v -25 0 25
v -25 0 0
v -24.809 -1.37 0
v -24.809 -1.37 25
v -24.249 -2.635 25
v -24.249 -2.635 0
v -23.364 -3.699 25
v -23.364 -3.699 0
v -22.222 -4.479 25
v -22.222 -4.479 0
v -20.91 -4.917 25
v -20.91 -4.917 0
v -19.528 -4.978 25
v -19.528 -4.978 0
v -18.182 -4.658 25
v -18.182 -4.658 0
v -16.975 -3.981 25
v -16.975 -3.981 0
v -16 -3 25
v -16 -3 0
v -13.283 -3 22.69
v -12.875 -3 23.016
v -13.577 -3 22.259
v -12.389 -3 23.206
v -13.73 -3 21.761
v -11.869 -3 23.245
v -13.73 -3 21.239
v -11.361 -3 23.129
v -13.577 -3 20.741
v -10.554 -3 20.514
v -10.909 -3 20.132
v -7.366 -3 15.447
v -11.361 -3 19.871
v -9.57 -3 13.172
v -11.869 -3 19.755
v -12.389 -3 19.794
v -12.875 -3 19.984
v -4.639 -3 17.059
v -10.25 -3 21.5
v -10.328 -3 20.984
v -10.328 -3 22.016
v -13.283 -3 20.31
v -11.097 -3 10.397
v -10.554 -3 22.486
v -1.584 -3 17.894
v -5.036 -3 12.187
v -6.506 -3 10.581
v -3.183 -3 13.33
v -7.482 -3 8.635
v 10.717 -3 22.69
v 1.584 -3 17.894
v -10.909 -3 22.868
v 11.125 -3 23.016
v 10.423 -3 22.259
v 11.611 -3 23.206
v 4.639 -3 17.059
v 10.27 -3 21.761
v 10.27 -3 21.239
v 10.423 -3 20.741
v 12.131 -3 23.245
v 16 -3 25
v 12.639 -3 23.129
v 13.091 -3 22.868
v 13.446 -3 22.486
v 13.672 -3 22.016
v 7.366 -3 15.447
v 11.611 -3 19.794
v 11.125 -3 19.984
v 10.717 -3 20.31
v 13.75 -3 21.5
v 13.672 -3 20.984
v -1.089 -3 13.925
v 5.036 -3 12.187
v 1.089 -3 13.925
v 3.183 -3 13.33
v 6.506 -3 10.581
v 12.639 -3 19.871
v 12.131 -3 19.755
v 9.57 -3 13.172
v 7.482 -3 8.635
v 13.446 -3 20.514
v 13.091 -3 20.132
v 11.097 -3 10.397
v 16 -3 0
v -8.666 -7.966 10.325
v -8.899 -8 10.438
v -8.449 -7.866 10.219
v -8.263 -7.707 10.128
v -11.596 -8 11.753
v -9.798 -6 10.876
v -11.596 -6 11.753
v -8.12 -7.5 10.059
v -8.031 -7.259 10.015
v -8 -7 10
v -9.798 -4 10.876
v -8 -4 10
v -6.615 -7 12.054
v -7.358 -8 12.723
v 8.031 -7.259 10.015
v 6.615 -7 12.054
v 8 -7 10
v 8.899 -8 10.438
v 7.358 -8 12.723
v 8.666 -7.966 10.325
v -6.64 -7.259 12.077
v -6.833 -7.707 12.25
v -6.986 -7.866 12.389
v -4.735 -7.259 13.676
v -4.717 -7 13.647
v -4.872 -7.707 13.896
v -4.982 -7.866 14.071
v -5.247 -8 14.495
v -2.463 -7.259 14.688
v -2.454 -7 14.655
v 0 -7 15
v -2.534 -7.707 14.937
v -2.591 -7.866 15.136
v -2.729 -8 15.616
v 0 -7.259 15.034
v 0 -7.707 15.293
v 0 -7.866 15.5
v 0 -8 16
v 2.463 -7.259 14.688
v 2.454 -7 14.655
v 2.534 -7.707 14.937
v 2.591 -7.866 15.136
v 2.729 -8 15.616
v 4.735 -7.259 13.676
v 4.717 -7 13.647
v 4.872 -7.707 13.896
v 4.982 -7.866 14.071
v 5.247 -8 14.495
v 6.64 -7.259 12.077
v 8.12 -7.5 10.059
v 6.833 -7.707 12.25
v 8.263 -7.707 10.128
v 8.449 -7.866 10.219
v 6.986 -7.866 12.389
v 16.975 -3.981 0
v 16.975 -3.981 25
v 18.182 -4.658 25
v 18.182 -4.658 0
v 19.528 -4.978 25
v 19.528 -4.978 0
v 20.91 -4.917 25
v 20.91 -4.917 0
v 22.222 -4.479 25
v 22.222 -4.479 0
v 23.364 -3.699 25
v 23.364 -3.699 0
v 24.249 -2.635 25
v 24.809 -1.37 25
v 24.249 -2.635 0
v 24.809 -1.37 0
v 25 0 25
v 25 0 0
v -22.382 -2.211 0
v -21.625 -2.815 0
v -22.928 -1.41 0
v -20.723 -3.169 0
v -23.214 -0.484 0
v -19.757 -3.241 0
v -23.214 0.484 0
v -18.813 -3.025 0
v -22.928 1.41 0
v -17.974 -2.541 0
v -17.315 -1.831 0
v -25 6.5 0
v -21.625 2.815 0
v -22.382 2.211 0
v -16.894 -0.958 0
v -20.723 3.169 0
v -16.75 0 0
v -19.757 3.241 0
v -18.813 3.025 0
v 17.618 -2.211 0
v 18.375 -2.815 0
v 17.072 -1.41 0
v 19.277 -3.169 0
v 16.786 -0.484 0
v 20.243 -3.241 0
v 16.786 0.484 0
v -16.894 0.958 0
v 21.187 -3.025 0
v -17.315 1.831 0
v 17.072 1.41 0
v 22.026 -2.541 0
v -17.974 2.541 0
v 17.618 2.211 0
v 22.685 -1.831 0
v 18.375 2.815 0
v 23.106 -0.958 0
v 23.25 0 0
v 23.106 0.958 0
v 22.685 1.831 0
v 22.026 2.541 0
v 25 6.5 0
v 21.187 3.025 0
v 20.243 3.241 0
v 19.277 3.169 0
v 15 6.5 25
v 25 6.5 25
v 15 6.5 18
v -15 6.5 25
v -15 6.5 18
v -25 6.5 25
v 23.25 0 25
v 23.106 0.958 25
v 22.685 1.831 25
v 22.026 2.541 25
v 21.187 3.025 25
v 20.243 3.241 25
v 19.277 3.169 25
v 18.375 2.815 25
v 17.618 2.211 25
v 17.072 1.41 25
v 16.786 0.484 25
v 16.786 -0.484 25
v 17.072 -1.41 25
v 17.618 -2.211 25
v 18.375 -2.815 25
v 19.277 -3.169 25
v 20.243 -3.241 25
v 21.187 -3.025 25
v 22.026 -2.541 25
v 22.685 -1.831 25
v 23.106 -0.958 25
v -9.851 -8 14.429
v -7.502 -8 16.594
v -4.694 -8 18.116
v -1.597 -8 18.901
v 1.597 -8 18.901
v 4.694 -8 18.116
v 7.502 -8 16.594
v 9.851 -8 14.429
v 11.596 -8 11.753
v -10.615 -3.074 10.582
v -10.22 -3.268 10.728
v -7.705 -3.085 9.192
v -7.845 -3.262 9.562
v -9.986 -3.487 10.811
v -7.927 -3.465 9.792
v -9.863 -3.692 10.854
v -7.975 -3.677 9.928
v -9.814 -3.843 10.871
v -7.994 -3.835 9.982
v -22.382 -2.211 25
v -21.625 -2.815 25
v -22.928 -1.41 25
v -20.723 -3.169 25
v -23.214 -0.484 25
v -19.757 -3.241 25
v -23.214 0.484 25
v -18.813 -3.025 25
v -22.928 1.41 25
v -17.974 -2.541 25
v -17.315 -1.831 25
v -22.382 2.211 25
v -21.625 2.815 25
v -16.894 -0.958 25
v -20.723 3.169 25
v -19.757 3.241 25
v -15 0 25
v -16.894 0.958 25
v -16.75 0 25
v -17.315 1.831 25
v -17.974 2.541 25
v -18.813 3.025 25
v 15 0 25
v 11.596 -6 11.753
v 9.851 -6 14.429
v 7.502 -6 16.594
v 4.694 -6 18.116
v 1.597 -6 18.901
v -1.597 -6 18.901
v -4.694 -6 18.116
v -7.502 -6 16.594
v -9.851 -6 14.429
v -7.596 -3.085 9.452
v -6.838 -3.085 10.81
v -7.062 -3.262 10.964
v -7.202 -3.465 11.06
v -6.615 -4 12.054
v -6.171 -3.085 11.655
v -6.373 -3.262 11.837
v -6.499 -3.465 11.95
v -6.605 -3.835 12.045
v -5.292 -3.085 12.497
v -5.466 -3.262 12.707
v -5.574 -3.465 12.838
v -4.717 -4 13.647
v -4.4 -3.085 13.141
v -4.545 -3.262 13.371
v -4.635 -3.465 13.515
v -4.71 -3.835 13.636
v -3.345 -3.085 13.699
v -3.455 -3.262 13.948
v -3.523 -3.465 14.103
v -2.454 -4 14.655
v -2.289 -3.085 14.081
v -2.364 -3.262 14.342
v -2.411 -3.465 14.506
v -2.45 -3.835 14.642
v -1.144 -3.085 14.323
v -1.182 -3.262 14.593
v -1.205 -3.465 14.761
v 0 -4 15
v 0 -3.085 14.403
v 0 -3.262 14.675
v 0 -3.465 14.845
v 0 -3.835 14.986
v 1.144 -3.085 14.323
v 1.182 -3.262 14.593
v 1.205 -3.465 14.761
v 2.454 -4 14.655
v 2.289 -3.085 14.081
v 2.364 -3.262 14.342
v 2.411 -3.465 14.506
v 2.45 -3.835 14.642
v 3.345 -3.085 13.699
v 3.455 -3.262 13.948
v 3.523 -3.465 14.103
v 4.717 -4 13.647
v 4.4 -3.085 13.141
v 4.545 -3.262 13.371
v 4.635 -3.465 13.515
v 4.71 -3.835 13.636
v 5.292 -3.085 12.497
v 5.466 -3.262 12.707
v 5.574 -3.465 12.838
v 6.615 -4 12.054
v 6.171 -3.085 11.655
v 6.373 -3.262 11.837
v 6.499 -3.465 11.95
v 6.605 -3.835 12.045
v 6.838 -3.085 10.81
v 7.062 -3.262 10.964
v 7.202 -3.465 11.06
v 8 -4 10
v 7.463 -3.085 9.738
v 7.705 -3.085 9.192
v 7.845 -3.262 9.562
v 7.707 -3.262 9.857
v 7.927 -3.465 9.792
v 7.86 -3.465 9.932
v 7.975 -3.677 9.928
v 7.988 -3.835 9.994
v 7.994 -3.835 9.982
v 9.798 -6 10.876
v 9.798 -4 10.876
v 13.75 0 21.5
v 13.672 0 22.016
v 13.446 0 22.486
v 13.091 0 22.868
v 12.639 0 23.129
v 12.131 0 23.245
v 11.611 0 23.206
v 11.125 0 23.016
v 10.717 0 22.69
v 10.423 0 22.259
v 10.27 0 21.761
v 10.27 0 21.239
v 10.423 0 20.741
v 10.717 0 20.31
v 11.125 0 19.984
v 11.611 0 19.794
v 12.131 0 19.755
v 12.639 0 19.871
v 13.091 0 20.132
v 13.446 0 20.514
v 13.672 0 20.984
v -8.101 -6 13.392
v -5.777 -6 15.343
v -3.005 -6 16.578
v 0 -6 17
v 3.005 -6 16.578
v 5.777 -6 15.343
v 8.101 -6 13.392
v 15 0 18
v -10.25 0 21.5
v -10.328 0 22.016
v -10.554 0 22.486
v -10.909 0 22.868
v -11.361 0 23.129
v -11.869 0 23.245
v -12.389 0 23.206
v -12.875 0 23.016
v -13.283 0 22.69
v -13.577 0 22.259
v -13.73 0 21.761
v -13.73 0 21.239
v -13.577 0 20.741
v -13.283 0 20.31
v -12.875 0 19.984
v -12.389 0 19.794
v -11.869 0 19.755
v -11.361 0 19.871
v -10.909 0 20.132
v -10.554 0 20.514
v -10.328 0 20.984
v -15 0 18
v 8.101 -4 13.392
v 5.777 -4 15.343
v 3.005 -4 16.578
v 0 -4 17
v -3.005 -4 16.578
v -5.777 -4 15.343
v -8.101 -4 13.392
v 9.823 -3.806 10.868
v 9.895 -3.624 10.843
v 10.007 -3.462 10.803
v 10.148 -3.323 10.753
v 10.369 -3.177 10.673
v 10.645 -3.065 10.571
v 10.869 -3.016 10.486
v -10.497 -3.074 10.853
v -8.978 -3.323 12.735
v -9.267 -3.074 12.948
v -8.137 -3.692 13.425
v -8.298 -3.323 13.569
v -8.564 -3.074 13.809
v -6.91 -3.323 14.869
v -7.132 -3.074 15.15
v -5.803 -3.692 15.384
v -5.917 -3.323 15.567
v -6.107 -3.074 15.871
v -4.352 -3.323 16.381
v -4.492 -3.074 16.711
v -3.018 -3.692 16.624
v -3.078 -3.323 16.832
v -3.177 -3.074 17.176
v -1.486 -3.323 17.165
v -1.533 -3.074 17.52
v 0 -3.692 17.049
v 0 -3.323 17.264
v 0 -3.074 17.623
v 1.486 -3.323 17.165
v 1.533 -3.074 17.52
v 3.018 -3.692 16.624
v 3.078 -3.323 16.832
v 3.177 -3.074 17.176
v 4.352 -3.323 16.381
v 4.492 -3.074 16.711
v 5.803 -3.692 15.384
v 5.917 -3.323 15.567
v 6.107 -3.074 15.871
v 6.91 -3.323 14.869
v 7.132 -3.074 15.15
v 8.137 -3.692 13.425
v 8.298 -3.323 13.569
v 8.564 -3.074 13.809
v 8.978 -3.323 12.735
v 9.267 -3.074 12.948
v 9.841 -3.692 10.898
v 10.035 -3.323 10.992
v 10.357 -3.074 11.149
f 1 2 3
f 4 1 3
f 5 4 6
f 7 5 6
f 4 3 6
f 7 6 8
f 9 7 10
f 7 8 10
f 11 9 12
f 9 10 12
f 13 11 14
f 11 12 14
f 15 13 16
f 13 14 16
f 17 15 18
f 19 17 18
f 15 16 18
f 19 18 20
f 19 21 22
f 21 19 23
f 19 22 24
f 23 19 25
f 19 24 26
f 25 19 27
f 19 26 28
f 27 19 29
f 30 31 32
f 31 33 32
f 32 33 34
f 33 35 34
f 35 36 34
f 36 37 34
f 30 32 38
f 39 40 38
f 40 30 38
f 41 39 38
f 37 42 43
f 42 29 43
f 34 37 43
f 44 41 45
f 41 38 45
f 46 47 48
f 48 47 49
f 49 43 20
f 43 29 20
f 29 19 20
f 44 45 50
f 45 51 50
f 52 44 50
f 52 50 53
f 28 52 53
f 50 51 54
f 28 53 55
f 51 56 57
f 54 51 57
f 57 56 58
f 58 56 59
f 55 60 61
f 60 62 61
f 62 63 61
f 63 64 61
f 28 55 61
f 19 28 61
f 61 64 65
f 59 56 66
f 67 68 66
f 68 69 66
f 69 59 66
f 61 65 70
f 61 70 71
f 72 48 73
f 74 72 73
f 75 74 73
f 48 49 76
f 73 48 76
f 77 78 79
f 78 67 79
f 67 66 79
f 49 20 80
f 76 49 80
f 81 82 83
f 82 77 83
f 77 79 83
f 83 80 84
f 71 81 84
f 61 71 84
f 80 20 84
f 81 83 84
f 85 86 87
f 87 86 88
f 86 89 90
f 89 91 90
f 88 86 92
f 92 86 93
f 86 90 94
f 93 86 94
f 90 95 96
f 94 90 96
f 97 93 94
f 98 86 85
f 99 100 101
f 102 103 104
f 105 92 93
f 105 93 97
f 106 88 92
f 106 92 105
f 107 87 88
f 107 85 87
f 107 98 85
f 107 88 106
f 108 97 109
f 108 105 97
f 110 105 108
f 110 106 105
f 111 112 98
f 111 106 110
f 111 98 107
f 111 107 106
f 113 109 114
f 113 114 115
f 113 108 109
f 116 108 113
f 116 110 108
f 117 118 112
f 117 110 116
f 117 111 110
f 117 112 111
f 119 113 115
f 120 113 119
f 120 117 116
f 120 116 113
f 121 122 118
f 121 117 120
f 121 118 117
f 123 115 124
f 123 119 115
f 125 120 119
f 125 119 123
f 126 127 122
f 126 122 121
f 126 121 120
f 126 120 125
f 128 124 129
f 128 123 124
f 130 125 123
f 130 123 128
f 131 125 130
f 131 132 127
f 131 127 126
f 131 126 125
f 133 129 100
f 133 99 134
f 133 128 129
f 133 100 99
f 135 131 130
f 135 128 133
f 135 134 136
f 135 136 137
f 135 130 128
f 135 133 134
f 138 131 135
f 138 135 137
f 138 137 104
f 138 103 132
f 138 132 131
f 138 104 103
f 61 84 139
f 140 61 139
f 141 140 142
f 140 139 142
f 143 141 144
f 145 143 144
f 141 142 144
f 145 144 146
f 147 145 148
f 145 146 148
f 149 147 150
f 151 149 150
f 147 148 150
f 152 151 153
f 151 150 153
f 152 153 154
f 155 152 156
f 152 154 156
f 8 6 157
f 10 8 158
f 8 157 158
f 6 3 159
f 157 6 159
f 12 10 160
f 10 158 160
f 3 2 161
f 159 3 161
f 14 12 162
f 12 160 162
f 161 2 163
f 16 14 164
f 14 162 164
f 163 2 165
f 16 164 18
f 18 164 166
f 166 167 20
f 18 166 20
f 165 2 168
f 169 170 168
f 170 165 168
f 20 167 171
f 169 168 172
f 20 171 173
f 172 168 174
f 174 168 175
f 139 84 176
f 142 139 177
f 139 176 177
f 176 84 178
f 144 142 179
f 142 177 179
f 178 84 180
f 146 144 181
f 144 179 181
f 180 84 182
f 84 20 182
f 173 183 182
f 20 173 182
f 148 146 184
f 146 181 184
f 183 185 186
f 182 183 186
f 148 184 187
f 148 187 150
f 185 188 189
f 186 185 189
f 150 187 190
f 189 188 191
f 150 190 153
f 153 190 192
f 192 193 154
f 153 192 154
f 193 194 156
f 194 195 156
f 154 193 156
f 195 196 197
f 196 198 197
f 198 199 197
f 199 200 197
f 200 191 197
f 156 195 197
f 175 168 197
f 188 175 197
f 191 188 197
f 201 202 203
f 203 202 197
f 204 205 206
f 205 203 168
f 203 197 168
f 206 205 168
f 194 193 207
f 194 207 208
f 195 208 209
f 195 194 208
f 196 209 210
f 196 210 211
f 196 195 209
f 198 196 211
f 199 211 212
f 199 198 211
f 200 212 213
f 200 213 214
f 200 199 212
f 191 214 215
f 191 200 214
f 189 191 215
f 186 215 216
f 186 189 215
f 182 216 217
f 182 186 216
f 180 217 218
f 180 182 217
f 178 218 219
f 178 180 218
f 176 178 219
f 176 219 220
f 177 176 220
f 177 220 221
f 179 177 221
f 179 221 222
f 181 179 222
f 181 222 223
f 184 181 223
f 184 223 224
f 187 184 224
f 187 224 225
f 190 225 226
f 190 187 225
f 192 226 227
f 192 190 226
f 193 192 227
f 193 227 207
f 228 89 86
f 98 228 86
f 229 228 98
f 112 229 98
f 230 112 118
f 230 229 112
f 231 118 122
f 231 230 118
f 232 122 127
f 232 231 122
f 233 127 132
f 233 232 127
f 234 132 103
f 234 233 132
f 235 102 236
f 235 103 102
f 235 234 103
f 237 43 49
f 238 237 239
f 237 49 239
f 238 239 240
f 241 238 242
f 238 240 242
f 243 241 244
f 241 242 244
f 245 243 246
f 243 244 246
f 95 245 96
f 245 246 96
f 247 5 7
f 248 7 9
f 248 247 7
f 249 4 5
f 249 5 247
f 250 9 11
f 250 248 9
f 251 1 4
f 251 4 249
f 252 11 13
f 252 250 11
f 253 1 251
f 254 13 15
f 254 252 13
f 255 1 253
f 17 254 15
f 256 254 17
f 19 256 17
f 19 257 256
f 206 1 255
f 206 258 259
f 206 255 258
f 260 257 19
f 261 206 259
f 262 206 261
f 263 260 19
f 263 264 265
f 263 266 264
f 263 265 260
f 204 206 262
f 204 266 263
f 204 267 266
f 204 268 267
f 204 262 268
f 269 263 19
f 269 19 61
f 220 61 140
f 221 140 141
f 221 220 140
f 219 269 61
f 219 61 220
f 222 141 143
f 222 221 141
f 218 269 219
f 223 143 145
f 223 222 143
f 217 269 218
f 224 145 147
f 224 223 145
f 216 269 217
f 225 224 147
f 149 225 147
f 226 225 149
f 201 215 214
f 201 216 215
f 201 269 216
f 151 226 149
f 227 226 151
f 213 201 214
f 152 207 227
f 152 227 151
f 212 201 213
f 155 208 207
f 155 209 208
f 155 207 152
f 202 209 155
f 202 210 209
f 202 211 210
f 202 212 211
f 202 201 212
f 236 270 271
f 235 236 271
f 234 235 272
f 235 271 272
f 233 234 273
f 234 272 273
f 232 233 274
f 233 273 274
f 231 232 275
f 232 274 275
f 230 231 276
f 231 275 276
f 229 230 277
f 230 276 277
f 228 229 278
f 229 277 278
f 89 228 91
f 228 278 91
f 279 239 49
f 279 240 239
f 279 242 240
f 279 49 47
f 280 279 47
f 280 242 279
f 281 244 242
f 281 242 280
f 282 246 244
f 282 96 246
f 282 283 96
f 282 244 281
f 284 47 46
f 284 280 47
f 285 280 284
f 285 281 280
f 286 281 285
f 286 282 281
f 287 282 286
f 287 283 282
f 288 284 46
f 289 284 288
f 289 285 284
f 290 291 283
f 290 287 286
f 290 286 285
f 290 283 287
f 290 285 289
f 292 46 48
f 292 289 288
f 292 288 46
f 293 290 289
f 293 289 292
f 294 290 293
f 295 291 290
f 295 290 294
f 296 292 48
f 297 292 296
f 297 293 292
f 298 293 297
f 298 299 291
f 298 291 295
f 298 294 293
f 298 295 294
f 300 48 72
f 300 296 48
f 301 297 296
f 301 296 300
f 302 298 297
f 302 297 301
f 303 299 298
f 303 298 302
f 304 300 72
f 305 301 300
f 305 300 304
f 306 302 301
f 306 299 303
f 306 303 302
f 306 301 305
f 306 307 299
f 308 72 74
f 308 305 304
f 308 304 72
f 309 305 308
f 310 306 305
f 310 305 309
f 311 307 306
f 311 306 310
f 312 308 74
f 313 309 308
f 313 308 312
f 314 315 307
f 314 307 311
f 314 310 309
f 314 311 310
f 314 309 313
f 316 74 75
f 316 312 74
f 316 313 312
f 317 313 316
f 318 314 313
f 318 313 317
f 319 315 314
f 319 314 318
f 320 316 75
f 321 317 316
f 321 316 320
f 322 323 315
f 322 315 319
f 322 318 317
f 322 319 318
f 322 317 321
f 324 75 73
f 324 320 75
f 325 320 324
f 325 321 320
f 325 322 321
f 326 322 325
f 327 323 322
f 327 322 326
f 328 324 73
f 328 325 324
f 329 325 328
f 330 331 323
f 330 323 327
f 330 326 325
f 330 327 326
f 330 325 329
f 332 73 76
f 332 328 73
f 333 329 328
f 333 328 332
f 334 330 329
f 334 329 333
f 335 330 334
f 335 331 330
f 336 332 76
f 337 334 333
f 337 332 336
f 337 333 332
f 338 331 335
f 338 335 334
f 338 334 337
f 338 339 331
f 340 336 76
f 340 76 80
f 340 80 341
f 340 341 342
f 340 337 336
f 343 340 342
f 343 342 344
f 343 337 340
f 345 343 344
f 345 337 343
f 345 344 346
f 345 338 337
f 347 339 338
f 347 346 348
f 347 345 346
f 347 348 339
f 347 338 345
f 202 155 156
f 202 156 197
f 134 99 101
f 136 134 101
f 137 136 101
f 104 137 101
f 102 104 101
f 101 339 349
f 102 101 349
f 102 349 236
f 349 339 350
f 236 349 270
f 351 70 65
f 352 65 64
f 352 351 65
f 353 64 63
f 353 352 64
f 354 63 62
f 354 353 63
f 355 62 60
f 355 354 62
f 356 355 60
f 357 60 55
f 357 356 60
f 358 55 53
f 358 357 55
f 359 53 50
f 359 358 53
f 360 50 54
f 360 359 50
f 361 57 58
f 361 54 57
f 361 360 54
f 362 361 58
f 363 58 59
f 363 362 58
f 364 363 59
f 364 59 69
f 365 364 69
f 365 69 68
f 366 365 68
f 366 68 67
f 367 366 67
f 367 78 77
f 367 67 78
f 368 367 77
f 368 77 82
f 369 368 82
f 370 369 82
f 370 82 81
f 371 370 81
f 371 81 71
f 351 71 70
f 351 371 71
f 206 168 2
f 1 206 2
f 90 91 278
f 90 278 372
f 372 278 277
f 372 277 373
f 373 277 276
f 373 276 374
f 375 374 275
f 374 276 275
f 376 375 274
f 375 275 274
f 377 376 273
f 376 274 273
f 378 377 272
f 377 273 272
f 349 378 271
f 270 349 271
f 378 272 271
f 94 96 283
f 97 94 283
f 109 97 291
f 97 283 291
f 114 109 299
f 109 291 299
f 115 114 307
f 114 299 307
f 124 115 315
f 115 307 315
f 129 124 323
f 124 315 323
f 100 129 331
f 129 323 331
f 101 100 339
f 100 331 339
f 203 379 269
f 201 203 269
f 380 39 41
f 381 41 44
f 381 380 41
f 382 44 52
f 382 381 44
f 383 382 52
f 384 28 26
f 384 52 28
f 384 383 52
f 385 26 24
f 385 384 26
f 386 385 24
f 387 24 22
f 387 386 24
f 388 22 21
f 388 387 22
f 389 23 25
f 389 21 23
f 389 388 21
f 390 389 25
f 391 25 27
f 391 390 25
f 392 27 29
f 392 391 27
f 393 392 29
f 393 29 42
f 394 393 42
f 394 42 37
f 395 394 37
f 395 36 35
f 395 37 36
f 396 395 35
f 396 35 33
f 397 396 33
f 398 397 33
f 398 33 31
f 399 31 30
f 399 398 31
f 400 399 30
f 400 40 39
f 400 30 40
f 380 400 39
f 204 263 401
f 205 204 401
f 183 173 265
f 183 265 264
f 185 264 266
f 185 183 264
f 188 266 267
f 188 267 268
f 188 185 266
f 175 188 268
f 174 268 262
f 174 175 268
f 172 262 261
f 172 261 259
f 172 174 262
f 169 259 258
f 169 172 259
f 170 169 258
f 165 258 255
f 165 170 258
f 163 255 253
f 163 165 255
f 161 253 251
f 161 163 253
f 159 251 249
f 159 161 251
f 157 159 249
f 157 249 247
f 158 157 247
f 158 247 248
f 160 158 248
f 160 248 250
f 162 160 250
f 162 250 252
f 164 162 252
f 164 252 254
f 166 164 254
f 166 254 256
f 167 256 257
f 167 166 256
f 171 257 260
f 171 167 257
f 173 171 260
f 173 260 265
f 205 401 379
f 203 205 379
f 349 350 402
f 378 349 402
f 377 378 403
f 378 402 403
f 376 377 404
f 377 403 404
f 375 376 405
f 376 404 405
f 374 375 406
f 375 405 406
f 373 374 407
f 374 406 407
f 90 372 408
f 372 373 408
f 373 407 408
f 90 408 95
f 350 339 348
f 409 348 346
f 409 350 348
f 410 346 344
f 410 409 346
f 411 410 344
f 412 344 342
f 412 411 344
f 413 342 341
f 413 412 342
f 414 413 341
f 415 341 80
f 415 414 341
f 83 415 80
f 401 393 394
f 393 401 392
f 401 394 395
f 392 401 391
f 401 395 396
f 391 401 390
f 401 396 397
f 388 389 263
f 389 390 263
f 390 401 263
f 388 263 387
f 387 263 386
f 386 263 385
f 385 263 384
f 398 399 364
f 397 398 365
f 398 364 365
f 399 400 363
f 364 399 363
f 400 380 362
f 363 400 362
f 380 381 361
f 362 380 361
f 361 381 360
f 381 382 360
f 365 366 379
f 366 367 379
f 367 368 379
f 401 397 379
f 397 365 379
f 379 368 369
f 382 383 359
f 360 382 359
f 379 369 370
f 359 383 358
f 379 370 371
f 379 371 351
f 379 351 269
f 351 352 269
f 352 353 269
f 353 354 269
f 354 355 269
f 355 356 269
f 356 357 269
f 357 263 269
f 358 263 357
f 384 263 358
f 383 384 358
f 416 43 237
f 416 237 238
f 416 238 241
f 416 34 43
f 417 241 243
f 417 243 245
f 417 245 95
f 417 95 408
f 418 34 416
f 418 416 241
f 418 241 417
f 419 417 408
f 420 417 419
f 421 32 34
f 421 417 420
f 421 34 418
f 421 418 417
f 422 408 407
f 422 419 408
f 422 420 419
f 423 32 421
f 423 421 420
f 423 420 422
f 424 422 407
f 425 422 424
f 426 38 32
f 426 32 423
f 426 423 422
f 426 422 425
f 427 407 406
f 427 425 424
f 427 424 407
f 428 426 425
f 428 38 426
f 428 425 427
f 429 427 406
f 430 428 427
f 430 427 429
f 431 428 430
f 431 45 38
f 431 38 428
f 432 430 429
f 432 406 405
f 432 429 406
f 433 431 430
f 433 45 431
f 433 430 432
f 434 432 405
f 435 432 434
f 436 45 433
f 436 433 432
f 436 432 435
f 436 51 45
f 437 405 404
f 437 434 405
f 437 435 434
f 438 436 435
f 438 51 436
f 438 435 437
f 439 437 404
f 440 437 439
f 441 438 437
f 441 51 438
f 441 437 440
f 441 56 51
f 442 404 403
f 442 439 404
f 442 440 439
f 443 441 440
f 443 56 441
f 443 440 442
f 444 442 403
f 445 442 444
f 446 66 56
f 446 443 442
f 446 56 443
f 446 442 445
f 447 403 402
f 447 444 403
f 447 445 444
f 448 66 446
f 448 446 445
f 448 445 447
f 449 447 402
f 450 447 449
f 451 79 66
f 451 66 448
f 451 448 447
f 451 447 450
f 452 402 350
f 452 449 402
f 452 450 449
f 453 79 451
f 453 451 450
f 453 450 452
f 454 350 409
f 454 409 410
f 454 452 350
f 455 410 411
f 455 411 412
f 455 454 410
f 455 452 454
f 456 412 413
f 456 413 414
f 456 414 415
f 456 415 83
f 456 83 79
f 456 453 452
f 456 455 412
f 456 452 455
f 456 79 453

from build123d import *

# Parameters (mm, degrees)
F0_R          = 3.25
F1_DEPTH      = 25
F3_DEPTH      = 8
F4_START      = 6
F4_DEPTH      = 2
F6_DEPTH      = 25
F7_R          = 1.75
F8_DEPTH      = 25
F8_DEPTH_BACK = 25
F9_R          = 1


with BuildPart() as f1:
    # F0 (on Top) → F1 (new body)
    with BuildSketch(Plane.XY):
        with BuildLine():
            Line((-25, 6.5), (-25, 0))
            ThreePointArc((-25, 0), (-21.5811388301, -4.7434164903), (-16, -3))
            Line((-16, -3), (0, -3))
            Line((0, -3), (16, -3))
            ThreePointArc((16, -3), (21.5811388301, -4.7434164903), (25, 0))
            Line((25, 0), (25, 6.5))
            Line((25, 6.5), (-25, 6.5))
        make_face()
        with Locations((-20, 0)):
            Circle(F0_R, mode=Mode.SUBTRACT)
        with Locations((20, 0)):
            Circle(F0_R, mode=Mode.SUBTRACT)
    extrude(amount=F1_DEPTH)

    # F2 (on Front) → F3 (join)
    with BuildSketch(Plane.XZ):
        with BuildLine():
            ThreePointArc((-8, 10), (0, 15), (8, 10))
            Line((8, 10), (9.797752809, 10.8764044944))
            ThreePointArc((9.797752809, 10.8764044944), (0, 17), (-9.797752809, 10.8764044944))
            Line((-9.797752809, 10.8764044944), (-8, 10))
        make_face()
    extrude(amount=F3_DEPTH)

    # F2 (on Front) → F4 (join)
    with BuildSketch(Plane.XZ.offset(F4_START)):
        with BuildLine():
            ThreePointArc((-9.797752809, 10.8764044944), (0, 17), (9.797752809, 10.8764044944))
            Line((9.797752809, 10.8764044944), (11.595505618, 11.7528089888))
            ThreePointArc((11.595505618, 11.7528089888), (0, 19), (-11.595505618, 11.7528089888))
            Line((-11.595505618, 11.7528089888), (-9.797752809, 10.8764044944))
        make_face()
    extrude(amount=F4_DEPTH)

    # F5 (on Front) → F6 (cut)
    with BuildSketch(Plane.XZ):
        Polygon((-15, 18), (0, 18), (15, 18), (15, 26), (-15, 26), align=None)
    extrude(amount=-F6_DEPTH, mode=Mode.SUBTRACT)

    # F7 (on Front) → F8 (cut, two sides)
    with BuildSketch(Plane.XZ) as f8_sk:
        with Locations((-12, 21.5)):
            Circle(F7_R)
        with Locations((12, 21.5)):
            Circle(F7_R)
    extrude(amount=-F8_DEPTH, mode=Mode.SUBTRACT)
    extrude(f8_sk.sketch, amount=F8_DEPTH_BACK, mode=Mode.SUBTRACT)

    # F9
    f9_edges = [f1.edges().sort_by_distance(p)[0] for p in [
        (0, -3, 15),
        (-8.898876, -3, 10.438202),
        (8.898876, -3, 10.438202),
        (0, -3, 17),
        (0, -8, 15),
    ]]
    fillet(f9_edges, radius=F9_R)


solid = f1.part
